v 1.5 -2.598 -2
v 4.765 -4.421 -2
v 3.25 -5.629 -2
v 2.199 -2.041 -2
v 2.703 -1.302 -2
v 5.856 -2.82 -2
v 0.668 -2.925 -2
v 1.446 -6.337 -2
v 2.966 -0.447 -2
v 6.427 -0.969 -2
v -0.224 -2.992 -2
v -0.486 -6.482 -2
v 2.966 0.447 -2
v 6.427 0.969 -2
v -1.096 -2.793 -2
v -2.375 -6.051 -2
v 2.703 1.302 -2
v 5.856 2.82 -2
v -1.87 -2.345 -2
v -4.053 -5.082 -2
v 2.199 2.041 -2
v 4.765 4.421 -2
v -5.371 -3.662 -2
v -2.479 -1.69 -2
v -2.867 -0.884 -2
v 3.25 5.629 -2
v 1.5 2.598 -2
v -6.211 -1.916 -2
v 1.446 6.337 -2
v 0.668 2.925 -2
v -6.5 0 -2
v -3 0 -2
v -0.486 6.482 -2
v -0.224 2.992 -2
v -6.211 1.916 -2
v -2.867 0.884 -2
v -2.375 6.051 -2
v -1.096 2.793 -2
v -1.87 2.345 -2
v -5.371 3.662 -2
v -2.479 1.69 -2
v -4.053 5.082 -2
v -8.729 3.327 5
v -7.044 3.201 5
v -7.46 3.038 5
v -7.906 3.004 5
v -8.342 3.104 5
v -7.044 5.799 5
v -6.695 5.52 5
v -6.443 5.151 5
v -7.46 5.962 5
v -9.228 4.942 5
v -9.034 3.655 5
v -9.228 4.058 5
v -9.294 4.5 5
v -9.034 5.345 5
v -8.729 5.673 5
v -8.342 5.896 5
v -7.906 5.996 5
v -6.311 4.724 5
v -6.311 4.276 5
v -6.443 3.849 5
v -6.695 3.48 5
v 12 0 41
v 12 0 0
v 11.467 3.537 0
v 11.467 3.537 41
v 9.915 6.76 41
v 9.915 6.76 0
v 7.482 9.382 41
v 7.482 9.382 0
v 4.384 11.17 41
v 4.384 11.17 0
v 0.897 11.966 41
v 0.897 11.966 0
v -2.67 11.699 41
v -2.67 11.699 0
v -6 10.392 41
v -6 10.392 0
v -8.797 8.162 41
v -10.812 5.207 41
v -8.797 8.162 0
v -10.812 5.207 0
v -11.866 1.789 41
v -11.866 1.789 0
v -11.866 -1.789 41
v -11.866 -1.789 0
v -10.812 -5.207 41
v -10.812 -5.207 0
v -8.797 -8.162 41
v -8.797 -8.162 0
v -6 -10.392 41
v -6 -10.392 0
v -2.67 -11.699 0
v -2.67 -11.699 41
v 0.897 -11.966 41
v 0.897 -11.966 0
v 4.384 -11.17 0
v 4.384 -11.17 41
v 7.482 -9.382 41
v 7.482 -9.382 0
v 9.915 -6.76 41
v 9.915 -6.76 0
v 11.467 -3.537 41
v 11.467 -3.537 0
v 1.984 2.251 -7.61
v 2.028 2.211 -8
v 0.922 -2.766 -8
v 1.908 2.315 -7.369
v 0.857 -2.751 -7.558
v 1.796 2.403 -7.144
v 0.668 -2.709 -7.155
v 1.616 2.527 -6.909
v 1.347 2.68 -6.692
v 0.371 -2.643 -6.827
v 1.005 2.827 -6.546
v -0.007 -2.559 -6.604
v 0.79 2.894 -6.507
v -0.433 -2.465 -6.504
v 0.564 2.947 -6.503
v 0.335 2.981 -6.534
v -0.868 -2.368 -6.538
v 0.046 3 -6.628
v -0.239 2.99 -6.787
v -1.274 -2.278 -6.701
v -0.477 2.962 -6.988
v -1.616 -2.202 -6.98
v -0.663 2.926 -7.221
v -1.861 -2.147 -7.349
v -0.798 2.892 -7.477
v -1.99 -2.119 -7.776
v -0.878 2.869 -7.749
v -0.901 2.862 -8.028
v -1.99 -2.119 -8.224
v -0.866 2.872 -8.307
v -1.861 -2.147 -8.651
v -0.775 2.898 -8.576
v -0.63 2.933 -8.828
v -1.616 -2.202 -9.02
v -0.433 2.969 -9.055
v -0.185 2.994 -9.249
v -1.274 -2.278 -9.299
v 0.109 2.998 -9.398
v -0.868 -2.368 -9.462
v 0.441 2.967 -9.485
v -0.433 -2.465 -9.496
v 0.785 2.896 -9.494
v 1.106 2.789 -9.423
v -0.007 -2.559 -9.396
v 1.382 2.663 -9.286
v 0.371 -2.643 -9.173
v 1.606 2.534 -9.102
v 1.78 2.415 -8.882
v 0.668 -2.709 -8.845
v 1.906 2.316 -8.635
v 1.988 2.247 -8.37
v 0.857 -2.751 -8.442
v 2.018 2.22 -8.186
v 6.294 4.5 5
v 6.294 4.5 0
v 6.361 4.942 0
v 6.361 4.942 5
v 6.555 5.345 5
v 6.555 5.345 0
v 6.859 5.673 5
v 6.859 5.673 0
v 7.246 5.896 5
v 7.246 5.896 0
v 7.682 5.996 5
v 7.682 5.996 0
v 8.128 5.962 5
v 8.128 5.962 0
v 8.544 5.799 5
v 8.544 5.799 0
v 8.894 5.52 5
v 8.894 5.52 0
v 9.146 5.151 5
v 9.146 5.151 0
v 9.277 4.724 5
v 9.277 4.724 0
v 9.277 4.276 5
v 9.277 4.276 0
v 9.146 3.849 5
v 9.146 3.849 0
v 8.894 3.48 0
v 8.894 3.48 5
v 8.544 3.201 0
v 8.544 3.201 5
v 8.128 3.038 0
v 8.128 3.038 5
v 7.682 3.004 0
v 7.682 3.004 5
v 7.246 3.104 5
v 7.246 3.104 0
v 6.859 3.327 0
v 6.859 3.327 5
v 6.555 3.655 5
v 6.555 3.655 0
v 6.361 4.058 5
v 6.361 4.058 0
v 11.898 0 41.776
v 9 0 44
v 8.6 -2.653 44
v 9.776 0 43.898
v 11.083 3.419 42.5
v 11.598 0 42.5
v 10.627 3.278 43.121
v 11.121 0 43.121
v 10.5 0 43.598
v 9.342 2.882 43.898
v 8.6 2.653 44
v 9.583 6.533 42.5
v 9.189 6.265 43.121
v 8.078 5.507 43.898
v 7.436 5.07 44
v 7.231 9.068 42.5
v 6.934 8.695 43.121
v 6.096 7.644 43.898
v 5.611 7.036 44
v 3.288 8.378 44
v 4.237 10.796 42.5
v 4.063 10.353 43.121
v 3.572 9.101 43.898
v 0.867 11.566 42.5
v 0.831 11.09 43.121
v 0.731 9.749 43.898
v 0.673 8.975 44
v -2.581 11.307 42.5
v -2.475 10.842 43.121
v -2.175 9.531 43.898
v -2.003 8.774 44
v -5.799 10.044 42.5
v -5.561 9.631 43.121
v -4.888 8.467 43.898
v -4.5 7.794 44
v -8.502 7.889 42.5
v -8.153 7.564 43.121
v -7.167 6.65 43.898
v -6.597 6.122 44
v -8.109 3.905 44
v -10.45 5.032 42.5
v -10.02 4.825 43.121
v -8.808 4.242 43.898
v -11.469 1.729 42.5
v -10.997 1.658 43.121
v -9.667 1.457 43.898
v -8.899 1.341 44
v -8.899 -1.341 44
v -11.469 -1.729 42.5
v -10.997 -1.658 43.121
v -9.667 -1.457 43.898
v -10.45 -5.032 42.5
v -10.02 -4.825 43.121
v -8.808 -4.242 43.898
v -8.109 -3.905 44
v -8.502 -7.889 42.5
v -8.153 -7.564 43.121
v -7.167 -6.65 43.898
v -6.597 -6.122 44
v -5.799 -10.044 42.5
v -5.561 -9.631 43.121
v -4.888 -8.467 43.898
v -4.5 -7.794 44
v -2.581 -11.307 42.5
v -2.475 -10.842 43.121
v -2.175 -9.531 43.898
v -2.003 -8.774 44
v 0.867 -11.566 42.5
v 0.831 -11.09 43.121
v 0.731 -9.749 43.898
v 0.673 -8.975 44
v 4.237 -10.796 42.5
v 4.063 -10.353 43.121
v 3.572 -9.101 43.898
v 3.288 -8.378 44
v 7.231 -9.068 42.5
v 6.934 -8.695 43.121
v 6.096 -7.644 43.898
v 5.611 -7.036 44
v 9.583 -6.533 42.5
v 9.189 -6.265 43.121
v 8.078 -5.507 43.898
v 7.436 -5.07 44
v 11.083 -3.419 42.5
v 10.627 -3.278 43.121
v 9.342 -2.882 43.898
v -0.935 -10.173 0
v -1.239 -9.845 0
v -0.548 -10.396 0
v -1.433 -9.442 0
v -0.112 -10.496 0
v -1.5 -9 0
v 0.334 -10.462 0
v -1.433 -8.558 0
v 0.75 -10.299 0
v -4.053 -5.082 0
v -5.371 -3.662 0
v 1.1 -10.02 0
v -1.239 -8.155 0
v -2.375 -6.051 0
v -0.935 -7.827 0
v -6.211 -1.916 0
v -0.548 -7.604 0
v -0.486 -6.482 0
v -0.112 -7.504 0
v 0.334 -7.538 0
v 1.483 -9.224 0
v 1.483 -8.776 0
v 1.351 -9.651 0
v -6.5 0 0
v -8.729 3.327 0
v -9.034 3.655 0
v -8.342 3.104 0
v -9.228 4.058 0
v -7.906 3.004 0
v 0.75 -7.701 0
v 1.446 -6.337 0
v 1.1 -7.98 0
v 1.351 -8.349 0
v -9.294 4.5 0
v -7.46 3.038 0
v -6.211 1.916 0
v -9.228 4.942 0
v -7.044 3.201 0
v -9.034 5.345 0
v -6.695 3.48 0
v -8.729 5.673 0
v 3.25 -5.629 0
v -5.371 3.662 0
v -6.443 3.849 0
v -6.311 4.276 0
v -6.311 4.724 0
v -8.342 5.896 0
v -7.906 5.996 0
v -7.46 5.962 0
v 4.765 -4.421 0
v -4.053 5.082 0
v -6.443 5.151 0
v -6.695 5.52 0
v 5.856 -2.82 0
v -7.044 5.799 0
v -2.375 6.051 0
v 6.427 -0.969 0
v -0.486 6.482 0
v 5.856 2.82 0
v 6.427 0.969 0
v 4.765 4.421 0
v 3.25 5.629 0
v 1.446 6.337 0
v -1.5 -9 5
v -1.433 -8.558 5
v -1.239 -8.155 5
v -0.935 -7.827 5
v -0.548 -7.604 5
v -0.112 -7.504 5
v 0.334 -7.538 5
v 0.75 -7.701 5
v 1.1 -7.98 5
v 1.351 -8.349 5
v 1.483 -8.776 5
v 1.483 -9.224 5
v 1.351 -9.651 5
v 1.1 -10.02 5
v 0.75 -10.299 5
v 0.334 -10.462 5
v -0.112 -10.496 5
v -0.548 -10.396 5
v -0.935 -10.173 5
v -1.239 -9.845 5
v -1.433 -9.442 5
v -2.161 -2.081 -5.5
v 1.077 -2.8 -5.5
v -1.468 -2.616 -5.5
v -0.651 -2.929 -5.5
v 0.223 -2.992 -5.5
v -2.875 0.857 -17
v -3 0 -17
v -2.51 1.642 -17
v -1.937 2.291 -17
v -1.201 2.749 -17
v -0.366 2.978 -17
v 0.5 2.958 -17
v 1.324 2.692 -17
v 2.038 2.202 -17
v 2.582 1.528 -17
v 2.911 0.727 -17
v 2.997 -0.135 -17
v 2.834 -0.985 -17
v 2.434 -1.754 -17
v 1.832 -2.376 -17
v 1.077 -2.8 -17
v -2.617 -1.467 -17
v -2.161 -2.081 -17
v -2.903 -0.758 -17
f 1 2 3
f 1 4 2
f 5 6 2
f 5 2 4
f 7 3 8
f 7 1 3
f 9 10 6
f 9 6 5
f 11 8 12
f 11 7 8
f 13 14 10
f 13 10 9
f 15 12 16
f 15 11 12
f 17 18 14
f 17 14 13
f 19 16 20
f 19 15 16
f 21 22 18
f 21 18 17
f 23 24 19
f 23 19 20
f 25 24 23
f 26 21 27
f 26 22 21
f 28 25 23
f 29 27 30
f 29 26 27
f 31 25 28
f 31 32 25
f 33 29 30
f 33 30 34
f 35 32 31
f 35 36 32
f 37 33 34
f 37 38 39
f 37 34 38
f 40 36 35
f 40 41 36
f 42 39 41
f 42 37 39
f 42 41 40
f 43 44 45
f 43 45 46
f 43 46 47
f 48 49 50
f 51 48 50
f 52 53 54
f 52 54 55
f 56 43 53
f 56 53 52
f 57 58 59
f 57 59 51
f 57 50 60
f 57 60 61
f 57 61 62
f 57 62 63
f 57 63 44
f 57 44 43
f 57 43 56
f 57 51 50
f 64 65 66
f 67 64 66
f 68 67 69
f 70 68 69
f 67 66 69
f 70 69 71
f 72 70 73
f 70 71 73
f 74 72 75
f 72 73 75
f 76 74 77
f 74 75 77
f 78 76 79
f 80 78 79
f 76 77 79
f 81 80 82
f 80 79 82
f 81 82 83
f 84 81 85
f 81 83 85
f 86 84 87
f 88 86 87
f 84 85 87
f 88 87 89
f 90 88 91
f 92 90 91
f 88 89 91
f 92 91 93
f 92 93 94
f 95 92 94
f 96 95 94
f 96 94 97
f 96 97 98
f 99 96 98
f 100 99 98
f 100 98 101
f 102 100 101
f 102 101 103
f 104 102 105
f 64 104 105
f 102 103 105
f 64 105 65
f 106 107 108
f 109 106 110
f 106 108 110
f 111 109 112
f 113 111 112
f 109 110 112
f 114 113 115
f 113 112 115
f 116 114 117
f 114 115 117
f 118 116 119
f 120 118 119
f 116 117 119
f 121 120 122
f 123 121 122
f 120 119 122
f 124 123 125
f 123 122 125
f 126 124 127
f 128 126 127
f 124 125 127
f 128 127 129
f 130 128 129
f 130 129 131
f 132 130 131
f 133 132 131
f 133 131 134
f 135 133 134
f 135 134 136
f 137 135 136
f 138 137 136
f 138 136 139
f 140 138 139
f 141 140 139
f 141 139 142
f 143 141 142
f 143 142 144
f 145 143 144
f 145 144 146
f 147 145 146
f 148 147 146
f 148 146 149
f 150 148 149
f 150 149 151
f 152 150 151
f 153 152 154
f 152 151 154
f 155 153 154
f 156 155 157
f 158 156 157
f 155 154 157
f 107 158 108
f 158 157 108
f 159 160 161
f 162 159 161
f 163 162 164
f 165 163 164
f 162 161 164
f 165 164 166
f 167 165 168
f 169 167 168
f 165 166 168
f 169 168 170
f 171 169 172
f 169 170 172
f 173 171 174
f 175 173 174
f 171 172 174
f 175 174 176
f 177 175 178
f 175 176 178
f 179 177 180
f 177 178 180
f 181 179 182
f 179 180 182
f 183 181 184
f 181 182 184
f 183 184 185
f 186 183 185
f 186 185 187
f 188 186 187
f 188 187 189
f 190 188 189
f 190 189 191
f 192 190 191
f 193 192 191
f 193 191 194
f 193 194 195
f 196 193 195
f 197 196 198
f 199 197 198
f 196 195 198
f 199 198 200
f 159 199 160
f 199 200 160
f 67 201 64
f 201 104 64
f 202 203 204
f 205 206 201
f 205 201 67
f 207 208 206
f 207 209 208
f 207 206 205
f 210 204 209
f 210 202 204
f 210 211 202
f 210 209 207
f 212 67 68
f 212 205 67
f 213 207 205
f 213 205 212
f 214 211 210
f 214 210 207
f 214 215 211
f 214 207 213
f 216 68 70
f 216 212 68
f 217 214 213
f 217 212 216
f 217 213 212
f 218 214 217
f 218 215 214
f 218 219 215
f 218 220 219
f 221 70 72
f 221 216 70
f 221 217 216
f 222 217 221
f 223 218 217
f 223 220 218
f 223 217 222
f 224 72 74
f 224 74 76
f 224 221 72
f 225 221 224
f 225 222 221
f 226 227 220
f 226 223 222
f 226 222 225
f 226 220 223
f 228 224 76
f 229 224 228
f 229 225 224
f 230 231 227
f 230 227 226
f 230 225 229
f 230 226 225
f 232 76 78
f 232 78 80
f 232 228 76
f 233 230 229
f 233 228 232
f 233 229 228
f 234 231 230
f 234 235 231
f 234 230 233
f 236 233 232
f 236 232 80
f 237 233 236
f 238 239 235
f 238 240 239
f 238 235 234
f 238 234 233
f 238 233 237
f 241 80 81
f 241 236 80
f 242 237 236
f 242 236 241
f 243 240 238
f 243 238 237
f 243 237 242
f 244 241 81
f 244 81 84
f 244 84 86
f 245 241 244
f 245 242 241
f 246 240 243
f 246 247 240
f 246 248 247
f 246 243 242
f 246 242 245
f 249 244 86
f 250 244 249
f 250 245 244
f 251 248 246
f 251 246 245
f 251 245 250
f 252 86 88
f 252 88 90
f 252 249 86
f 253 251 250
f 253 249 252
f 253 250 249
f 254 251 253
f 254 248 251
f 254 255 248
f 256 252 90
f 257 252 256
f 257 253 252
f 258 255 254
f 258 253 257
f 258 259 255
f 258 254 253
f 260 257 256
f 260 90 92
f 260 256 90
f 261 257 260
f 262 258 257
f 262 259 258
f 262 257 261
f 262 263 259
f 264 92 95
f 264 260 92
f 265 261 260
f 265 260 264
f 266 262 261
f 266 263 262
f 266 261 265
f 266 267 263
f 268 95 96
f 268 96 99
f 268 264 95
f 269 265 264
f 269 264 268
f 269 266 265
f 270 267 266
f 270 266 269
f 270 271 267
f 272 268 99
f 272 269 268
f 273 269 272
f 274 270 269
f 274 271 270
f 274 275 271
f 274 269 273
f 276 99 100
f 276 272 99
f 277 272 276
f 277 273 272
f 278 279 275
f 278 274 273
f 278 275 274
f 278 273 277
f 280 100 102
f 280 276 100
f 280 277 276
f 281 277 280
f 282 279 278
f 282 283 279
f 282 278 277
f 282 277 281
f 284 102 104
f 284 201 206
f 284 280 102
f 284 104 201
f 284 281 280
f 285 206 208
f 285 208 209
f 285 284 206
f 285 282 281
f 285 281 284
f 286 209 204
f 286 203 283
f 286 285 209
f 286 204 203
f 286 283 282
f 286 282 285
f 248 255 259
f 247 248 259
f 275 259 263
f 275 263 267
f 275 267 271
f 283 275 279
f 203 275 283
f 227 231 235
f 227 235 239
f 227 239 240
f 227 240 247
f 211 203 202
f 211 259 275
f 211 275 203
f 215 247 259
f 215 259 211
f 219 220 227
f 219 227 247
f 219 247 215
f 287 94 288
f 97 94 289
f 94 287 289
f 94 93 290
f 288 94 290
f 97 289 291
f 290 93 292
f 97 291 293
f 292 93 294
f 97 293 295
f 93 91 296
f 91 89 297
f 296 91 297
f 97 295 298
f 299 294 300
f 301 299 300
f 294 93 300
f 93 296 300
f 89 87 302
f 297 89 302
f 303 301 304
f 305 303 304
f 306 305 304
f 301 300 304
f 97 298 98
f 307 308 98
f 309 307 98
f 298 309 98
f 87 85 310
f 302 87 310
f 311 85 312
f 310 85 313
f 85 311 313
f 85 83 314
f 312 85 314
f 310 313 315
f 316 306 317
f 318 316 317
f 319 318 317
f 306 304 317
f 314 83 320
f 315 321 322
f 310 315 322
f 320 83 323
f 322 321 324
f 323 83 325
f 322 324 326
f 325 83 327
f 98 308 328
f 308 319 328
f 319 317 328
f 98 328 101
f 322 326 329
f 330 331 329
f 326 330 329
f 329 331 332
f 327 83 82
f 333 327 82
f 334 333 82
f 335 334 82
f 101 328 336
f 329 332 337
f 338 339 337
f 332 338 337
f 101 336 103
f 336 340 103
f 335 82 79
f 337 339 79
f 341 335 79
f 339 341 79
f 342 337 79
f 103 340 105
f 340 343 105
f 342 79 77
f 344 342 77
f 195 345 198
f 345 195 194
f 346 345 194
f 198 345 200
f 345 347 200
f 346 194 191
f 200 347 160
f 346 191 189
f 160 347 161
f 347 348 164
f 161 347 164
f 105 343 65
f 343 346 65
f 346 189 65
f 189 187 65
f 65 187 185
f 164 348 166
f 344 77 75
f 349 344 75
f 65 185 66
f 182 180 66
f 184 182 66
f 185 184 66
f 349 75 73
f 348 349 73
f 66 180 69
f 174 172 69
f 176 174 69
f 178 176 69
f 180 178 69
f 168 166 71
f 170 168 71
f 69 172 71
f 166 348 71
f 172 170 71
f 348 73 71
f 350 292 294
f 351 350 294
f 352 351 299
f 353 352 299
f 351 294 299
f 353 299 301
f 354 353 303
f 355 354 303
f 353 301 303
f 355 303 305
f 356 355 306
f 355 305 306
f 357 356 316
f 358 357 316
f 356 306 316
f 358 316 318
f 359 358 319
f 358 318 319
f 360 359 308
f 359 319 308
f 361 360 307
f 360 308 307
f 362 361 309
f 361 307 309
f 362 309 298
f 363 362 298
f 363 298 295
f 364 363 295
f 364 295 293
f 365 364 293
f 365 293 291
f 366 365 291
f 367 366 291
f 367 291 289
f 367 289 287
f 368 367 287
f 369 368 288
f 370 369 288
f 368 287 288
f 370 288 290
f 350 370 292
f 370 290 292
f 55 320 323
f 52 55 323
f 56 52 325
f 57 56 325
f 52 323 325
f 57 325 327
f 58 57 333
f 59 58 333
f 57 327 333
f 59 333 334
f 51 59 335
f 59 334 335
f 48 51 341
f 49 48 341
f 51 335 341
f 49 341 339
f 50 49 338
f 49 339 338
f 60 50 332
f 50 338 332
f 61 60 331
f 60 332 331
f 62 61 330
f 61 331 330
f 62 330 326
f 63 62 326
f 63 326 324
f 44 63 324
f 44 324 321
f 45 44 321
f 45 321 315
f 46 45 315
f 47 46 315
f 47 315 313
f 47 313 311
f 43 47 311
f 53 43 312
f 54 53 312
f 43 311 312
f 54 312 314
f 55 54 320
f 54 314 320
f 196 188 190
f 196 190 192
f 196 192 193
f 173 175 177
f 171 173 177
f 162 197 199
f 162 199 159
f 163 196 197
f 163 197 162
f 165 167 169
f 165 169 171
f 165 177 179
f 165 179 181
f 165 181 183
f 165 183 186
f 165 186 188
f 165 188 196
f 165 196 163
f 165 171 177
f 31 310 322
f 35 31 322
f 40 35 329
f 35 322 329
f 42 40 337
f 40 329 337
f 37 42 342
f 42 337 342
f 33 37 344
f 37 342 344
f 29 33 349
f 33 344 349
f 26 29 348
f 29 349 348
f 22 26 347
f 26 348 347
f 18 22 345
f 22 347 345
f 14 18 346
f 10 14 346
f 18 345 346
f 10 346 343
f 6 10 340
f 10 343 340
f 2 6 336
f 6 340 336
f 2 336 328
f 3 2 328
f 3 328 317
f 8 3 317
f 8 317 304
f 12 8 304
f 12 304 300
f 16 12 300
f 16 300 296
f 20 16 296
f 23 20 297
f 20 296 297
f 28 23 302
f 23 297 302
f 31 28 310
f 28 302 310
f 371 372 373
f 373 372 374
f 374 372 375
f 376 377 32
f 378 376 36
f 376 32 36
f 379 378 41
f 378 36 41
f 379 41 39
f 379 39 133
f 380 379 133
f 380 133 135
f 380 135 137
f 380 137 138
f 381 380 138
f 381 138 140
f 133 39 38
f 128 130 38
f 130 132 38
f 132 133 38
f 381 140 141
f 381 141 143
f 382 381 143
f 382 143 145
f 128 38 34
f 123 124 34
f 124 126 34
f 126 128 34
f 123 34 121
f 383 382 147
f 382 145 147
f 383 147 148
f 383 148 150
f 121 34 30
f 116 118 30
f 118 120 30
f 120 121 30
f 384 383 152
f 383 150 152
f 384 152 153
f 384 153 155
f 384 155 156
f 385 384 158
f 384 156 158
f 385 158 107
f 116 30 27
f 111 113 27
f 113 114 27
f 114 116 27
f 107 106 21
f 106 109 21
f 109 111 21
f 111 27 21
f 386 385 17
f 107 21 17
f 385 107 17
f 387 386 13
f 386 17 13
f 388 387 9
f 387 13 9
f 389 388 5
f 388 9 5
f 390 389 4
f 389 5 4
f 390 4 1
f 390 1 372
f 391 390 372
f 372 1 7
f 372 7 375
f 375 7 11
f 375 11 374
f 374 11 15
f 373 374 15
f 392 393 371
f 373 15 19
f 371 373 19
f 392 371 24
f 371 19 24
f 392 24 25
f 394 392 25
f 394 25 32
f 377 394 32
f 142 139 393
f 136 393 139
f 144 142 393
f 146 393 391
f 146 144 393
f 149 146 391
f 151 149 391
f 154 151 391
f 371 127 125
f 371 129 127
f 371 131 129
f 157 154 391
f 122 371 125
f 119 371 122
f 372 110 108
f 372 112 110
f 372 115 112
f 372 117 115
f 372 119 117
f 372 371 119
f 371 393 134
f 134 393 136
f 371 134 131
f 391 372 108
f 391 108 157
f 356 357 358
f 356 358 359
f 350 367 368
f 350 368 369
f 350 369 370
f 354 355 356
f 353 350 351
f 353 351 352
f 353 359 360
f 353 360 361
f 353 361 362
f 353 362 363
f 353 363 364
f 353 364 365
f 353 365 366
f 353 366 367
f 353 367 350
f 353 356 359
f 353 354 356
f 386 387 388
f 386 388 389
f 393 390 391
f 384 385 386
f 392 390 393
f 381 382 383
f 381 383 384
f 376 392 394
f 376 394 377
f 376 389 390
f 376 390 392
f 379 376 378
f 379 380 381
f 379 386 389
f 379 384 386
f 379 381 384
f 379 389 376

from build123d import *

# Parameters (mm, degrees)
SKETCH_1_R          = 12
EXTRUDE_1_DEPTH     = 44
SKETCH_2_R          = 6.5
EXTRUDE_2_DEPTH     = 2
SKETCH_3_R          = 3
EXTRUDE_3_DEPTH     = 15
SKETCH_4_R          = 1.5
CUT_EXTRUDE_1_DEPTH = 5
CUT_EXTRUDE_START   = -11.5
CUT_EXTRUDE_2_DEPTH = 11.5
SKETCH_6_R          = 1.5
CUT_EXTRUDE_3_DEPTH = 48.977426709
FILLET_1_R          = 3


with BuildPart() as part:
    # 草图1 → 凸台-拉伸1 (new body)
    with BuildSketch(Plane.XY):
        Circle(SKETCH_1_R)
    extrude(amount=EXTRUDE_1_DEPTH)

    # 草图2 → 凸台-拉伸2 (add)
    with BuildSketch(Plane(origin=(0, 0, 0), x_dir=(-1, 0, 0), z_dir=(0, 0, -1))):
        Circle(SKETCH_2_R)
    extrude(amount=EXTRUDE_2_DEPTH)

    # 草图3 → 凸台-拉伸3 (add)
    with BuildSketch(Plane(origin=(0, 0, -2), x_dir=(-1, 0, 0), z_dir=(0, 0, -1))):
        Circle(SKETCH_3_R)
    extrude(amount=EXTRUDE_3_DEPTH)

    # 草图4 → 切除-拉伸1 (cut)
    with BuildSketch(Plane(origin=(0, 0, 0), x_dir=(-1, 0, 0), z_dir=(0, 0, -1))):
        with Locations((0, -9)):
            Circle(SKETCH_4_R)
        with Locations((-7.794228634, 4.5)):
            Circle(SKETCH_4_R)
        with Locations((7.794228634, 4.5)):
            Circle(SKETCH_4_R)
    extrude(amount=-CUT_EXTRUDE_1_DEPTH, mode=Mode.SUBTRACT)

    # 草图5 → 切除-拉伸2 (cut)
    with BuildSketch(Plane(origin=(0, 0, -17), x_dir=(-1, 0, 0), z_dir=(0, 0, -1)).offset(CUT_EXTRUDE_START)):
        with BuildLine():
            Line((2.160985852, -2.08089888), (-1.076716839, -2.800121578))
            ThreePointArc((-1.076716839, -2.800121578), (0.650561408, -2.928612275), (2.160985852, -2.08089888))
        make_face()
    extrude(amount=CUT_EXTRUDE_2_DEPTH, mode=Mode.SUBTRACT)

    # 草图6 → 切除-拉伸3 (cut, through all)
    with BuildSketch(Plane(origin=(-0.542134506, -2.440510229, 0), x_dir=(-0.9762040915238366, 0.2168538025770379, 0), z_dir=(-0.2168538025770379, -0.9762040915238366, 0))):
        with Locations(Location((0, 8, 0), (0, 0, 180))):
            Circle(SKETCH_6_R)
    extrude(amount=-CUT_EXTRUDE_3_DEPTH, mode=Mode.SUBTRACT)

    # 圆角1
    fillet_1_edges = [part.edges().sort_by_distance(p)[0] for p in [
        (-12, 0, 44),
    ]]
    fillet(fillet_1_edges, radius=FILLET_1_R)


solid = part.part
